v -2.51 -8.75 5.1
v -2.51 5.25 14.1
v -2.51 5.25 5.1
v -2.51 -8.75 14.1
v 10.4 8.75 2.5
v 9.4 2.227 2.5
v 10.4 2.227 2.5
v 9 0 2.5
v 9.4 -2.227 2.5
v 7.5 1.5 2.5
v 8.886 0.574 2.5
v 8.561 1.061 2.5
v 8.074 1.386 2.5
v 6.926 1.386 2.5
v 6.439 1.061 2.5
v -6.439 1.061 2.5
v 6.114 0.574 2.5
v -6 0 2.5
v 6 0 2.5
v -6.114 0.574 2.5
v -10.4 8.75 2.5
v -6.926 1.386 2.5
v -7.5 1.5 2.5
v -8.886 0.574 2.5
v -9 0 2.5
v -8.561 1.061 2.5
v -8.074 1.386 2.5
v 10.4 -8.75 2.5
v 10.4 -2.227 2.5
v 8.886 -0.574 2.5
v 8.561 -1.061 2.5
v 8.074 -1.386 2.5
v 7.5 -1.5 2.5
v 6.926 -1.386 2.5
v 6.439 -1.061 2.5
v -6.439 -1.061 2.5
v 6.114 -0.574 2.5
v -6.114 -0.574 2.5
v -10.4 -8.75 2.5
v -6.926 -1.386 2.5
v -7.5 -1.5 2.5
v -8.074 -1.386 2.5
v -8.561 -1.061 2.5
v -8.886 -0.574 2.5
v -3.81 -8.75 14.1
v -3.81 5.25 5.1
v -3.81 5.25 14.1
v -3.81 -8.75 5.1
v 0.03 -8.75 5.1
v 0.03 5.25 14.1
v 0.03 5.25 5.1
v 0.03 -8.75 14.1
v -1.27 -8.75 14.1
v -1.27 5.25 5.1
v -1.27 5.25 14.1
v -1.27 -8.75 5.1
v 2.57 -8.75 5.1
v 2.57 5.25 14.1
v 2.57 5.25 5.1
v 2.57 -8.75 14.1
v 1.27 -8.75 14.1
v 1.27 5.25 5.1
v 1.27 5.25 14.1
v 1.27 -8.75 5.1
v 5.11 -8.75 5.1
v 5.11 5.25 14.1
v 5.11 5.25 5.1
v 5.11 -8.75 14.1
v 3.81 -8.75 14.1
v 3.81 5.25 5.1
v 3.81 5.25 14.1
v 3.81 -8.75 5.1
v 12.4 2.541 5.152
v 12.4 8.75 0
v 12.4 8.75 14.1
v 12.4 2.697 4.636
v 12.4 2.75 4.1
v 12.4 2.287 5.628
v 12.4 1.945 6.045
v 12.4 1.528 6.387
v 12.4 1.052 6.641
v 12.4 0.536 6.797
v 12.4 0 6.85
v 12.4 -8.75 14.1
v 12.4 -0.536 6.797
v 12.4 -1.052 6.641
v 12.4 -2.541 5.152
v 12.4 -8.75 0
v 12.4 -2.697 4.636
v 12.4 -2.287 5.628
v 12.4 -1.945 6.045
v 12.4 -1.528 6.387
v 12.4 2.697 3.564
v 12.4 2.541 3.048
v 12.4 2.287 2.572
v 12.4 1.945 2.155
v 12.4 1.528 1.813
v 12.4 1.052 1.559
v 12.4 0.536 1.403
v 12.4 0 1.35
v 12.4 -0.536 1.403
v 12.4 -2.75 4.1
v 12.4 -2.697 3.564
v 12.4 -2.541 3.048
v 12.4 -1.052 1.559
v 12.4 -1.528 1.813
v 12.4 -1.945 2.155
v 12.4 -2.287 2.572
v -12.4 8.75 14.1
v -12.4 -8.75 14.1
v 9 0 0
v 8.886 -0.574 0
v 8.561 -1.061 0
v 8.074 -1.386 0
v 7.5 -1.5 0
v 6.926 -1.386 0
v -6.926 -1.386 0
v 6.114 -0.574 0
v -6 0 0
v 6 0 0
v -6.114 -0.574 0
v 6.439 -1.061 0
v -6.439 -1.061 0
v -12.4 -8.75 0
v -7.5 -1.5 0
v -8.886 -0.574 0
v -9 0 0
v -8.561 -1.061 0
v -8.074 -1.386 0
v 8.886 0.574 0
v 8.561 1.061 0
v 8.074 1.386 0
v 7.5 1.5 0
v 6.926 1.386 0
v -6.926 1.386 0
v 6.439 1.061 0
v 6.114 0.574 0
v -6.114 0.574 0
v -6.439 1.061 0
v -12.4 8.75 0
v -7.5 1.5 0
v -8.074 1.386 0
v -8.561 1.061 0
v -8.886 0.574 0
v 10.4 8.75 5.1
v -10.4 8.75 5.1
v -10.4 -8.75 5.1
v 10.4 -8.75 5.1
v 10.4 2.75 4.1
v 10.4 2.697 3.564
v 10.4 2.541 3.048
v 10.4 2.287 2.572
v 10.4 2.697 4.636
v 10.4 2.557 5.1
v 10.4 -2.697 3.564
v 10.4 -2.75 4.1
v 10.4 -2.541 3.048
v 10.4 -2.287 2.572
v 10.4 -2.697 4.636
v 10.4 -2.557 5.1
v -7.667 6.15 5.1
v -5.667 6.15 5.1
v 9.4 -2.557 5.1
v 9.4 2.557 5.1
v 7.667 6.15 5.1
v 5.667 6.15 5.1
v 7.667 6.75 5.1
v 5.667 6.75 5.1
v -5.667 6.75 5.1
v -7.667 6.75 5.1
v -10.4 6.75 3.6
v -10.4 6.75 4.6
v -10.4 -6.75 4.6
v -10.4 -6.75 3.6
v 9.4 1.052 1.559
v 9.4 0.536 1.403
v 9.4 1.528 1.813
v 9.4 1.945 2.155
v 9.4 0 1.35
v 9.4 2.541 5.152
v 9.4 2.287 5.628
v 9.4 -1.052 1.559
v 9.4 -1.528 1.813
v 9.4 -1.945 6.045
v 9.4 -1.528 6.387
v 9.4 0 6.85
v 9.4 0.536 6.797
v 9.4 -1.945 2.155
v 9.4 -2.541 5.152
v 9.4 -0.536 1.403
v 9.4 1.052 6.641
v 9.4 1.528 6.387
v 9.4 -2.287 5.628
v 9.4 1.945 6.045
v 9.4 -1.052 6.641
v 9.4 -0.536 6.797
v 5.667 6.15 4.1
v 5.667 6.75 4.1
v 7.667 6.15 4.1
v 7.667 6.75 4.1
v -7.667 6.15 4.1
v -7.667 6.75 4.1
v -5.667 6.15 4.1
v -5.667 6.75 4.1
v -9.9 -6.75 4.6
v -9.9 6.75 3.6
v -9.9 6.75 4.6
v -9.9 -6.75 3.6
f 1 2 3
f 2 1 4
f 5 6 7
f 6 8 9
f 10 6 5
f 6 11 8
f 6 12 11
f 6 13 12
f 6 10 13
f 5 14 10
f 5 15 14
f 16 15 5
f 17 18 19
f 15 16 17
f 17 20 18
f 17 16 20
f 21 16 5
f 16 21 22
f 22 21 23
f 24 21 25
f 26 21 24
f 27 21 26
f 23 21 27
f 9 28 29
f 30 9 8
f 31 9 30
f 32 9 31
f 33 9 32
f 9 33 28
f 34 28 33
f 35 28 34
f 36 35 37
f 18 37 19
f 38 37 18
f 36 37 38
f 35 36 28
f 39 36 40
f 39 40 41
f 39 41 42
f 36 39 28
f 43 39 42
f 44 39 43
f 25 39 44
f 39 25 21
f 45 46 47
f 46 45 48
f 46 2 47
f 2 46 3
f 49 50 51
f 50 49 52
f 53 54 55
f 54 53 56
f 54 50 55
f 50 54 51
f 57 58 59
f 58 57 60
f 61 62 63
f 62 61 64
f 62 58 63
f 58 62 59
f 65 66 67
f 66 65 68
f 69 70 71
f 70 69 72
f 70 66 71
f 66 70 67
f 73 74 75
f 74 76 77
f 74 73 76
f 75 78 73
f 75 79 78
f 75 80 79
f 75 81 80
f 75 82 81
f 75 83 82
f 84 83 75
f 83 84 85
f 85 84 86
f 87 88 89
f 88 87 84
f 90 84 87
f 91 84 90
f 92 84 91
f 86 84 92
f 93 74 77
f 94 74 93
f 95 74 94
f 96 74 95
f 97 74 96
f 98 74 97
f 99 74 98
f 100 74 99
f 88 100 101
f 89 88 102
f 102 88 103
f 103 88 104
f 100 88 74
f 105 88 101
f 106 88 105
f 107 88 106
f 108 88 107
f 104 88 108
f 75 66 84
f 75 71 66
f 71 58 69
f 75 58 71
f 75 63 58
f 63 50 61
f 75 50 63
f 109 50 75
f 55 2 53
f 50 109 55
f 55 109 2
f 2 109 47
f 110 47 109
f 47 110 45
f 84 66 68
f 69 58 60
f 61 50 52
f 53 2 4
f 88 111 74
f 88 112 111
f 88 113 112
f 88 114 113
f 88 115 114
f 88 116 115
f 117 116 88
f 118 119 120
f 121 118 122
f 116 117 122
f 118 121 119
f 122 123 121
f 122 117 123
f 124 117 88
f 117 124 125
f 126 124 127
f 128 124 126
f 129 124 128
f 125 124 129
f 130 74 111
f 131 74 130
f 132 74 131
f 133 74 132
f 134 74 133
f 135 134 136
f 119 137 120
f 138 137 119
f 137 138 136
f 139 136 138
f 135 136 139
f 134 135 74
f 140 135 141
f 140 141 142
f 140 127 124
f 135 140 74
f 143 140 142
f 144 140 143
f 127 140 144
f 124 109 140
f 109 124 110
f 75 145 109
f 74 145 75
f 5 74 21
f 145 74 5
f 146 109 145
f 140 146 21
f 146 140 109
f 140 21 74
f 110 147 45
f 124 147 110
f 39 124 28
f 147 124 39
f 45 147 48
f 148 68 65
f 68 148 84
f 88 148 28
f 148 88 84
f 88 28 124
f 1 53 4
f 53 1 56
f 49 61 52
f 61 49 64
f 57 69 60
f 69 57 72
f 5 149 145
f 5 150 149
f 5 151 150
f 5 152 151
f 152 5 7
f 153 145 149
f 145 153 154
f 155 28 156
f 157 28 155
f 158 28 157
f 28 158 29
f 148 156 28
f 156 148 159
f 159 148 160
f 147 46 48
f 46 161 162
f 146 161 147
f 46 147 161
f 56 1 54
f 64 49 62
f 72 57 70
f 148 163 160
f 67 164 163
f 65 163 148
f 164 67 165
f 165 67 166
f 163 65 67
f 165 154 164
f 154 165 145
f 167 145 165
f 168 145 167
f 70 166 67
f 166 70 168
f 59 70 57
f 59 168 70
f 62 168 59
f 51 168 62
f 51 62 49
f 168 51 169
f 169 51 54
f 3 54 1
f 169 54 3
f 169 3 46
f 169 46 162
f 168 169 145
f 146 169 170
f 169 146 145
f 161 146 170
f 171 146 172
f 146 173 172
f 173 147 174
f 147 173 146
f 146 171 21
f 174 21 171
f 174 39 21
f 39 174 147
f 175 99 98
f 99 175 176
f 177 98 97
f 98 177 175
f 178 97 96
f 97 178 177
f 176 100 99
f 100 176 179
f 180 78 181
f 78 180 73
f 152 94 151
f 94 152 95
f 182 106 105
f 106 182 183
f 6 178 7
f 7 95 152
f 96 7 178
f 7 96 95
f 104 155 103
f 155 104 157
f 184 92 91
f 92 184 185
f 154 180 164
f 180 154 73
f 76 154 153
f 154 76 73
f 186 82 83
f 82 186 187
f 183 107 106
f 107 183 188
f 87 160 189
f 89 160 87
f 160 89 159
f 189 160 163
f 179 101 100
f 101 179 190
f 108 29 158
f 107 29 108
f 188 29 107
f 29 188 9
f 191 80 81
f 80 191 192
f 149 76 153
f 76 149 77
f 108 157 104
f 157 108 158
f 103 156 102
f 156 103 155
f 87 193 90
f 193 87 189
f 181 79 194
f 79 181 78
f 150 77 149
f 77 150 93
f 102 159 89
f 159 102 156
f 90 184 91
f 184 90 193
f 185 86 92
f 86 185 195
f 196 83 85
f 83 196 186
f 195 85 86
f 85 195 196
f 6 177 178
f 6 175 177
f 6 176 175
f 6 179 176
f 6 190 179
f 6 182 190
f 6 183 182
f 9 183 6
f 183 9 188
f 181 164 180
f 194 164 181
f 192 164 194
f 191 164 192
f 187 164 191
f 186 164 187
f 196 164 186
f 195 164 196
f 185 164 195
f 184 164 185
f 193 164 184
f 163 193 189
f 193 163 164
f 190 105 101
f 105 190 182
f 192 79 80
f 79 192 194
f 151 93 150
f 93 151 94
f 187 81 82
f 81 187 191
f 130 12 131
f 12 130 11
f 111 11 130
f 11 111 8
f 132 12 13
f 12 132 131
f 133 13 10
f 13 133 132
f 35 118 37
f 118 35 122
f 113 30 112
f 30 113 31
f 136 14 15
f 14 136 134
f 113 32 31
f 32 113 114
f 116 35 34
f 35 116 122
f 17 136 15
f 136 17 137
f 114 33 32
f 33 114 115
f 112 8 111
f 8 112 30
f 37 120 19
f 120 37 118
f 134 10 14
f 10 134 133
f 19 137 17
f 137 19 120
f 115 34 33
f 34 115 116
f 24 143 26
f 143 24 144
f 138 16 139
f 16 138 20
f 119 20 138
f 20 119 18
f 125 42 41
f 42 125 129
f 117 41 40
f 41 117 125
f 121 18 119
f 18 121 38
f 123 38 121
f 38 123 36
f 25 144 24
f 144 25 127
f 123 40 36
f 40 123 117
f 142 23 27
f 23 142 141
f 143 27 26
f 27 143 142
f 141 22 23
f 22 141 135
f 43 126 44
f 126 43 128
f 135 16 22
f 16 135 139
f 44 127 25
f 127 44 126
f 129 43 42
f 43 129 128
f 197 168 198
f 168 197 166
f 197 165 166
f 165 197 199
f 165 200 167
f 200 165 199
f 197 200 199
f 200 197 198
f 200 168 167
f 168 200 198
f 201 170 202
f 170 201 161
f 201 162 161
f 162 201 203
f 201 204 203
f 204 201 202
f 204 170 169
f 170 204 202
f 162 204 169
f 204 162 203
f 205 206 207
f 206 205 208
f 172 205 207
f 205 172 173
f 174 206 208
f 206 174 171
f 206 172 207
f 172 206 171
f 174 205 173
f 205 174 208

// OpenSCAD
/*
 * VL53L0X V2 TOF Sensor Case - Slide-In Design
 * Creative slide-in design for easy sensor insertion
 * 
 * Features:
 * - Sensor slides in from the side
 * - Open top for easy access
 * - Retention clips that snap into place
 * - Clear visual guide
 */

// ==========================================
// CONFIGURATION
// ==========================================

pcb_length = 20.0;
pcb_width = 12.7;
pcb_thickness = 1.6;
pin_spacing = 2.54;
pin_count = 4;
pin_diameter = 0.8;
pin_length = 10.0;
lens_diameter = 4.5;
wall_thickness = 2.0;
base_thickness = 2.5;
side_wall_height = 4.0;
clearance = 0.4;

// ==========================================
// SLIDE-IN CASE
// ==========================================

module slide_case() {
    total_l = pcb_length + clearance * 2 + wall_thickness * 2;
    total_w = pcb_width + clearance * 2 + wall_thickness * 2;
    
    difference() {
        // Main body
        translate([-total_l/2, -total_w/2, 0])
            cube([total_l, total_w, base_thickness + pcb_thickness + pin_length]);
        
        // PCB slot (open on top and one side)
        translate([
            -pcb_length/2 - clearance,
            -pcb_width/2 - clearance - 5, // Extended opening for slide-in
            base_thickness
        ])
            cube([
                pcb_length + clearance * 2,
                pcb_width + clearance * 2 + 10, // Extra space for insertion
                pcb_thickness + 1
            ]);
        
        // Pin channels
        for (i = [0:pin_count-1]) {
            translate([
                -(pin_count-1) * pin_spacing/2 + i * pin_spacing,
                -total_w/2 - 1,
                base_thickness
            ])
                cube([pin_diameter + 0.5, pin_length + 5, pin_length + 5]);
        }
        
        // Lens opening
        translate([
            total_l/2 - wall_thickness - 1,
            0,
            base_thickness + pcb_thickness
        ])
            rotate([0, 90, 0])
                cylinder(h = wall_thickness + 2, d = lens_diameter + 1, $fn=32);
        
        // Mounting holes
        translate([15/2, 0, -1])
            cylinder(h = base_thickness + 2, d = 3, $fn=16);
        translate([-15/2, 0, -1])
            cylinder(h = base_thickness + 2, d = 3, $fn=16);
    }
    
    // Retention clips (flexible tabs)
    clip_width = 2.0;
    clip_thickness = 0.6;
    
    // Front clip
    translate([
        pcb_length/3,
        pcb_width/2 + clearance,
        base_thickness + pcb_thickness
    ])
        rotate([90, 0, 0])
            linear_extrude(height = clip_thickness)
                polygon([
                    [-clip_width/2, 0],
                    [clip_width/2, 0],
                    [clip_width/2, 2],
                    [0, 2.5],
                    [-clip_width/2, 2]
                ]);
    
    translate([
        -pcb_length/3,
        pcb_width/2 + clearance,
        base_thickness + pcb_thickness
    ])
        rotate([90, 0, 0])
            linear_extrude(height = clip_thickness)
                polygon([
                    [-clip_width/2, 0],
                    [clip_width/2, 0],
                    [clip_width/2, 2],
                    [0, 2.5],
                    [-clip_width/2, 2]
                ]);
    
    // Side guide rails
    translate([
        -pcb_length/2 - clearance - 0.5,
        -pcb_width/2 - clearance,
        base_thickness + pcb_thickness - 0.5
    ])
        cube([1, pcb_width + clearance * 2, 1]);
}

slide_case();

// Visual guide
%translate([-pcb_length/2, -pcb_width/2, base_thickness])
    color("green", 0.3)
        cube([pcb_length, pcb_width, pcb_thickness]);
